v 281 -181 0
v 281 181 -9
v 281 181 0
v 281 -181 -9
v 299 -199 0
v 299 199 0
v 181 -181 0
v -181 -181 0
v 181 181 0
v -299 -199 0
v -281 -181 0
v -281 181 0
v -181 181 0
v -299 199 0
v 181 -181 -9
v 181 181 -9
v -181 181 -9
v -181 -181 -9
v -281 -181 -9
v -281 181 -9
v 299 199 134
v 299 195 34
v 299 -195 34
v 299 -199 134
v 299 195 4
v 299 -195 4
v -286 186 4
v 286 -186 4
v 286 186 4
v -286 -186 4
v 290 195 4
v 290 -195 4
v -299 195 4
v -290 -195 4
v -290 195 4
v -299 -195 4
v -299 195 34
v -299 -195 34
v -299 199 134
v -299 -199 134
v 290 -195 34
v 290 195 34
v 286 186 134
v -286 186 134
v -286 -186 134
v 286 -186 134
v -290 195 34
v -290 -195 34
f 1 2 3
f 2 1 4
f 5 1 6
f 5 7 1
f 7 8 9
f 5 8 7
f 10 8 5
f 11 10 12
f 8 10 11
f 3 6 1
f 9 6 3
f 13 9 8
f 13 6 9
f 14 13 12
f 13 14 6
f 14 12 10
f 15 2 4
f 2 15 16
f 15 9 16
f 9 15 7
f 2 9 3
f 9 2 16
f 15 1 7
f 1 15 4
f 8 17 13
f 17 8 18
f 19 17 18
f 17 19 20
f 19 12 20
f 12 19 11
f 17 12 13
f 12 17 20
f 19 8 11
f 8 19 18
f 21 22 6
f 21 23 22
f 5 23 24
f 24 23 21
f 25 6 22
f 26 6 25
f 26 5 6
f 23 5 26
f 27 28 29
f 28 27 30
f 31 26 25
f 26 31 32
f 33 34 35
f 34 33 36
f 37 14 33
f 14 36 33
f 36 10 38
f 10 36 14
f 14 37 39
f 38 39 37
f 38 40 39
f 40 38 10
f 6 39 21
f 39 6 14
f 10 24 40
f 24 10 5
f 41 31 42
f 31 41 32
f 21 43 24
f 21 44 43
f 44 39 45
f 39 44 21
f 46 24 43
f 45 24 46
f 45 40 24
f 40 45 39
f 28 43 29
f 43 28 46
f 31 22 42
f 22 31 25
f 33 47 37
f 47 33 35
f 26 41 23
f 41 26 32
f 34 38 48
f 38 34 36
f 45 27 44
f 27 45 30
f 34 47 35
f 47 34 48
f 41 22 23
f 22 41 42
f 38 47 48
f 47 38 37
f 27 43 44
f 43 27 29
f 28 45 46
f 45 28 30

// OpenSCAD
multiplex_4mm = 4;
multiplex_9mm = 9;
multiplex_12mm = 12;

eb_length = 598;
eb_width = 398;
eb_height_inner = 130; 

eb_in_out_diff = 18;

min_cut_width = 100;

//----------------------

plate_thickness = multiplex_4mm;
eb_height_stacked = eb_height_inner + plate_thickness;
echo("eb_height_inner", eb_height_inner);
echo("eb_height_stacked", eb_height_stacked);

//----------------------
// 2x footer
//----------------------
footer_single_size = [min_cut_width, eb_width-2*eb_in_out_diff, multiplex_9mm];

o_footer_x = (eb_length/2) - (min_cut_width/2) - eb_in_out_diff;
o_footer_z = multiplex_9mm/2;

translate([o_footer_x, 0, -o_footer_z])
    cube(footer_single_size, center = true);
translate([-o_footer_x, 0, -o_footer_z])
    cube(footer_single_size, center = true);
echo("footer:");
echo("2x", footer_single_size);

//----------------------
// 1x plate
//----------------------

o_plate_z = plate_thickness/2;
translate([0, 0, o_plate_z])
    cube([eb_length, eb_width, plate_thickness], center = true);
echo("plate:");
echo("1x", [eb_length, eb_width, plate_thickness]);

//----------------------
// 8x sides
//----------------------
sides_hight = (eb_height_inner/2) + plate_thickness;
side_short_length = eb_width - 2 * multiplex_4mm;

// sides-short-thin
o_short_x = eb_length/2-multiplex_4mm/2-multiplex_9mm;

translate([o_short_x, 0, sides_hight])
    cube([multiplex_4mm, side_short_length, eb_height_inner], center = true);
translate([-(o_short_x), 0, sides_hight])
    cube([multiplex_4mm, side_short_length, eb_height_inner], center = true);
echo("sides-short-thin:");
echo("2x", [multiplex_4mm, side_short_length, eb_height_inner]);

// sides-short-thick
o_short_T_z = eb_length/2-multiplex_9mm/2;
o_short_T_z_grip = (eb_height_inner - min_cut_width)/2;

translate([o_short_T_z, 0, sides_hight + o_short_T_z_grip])
    cube([multiplex_9mm, side_short_length, min_cut_width], center = true);
translate([-(o_short_T_z), 0, sides_hight + o_short_T_z_grip])
    cube([multiplex_9mm, side_short_length, min_cut_width], center = true);
echo("sides-short-thick:");
echo("2x", [multiplex_9mm, side_short_length, min_cut_width]);

// sides-long-thin
o_long_y = eb_width/2 - multiplex_4mm/2;
o_long_thick_y = eb_width/2 - multiplex_9mm/2 - multiplex_4mm;
side_long_length = eb_length - 2 * multiplex_9mm - 2 * multiplex_4mm;

translate([0, o_long_y, sides_hight])
    cube([eb_length, multiplex_4mm, eb_height_inner], center = true);
translate([0, -o_long_y, sides_hight])
    cube([eb_length, multiplex_4mm, eb_height_inner], center = true);
echo("sides-long-thin:");
echo("2x", [eb_length, multiplex_4mm, eb_height_inner]);


// sides-long-thick
translate([0, o_long_thick_y, sides_hight])
    cube([side_long_length, multiplex_9mm, eb_height_inner], center = true);
translate([0, -o_long_thick_y, sides_hight])
    cube([side_long_length, multiplex_9mm, eb_height_inner], center = true);
echo("sides-long-thick:");
echo("2x", [side_long_length, multiplex_9mm, eb_height_inner]);
